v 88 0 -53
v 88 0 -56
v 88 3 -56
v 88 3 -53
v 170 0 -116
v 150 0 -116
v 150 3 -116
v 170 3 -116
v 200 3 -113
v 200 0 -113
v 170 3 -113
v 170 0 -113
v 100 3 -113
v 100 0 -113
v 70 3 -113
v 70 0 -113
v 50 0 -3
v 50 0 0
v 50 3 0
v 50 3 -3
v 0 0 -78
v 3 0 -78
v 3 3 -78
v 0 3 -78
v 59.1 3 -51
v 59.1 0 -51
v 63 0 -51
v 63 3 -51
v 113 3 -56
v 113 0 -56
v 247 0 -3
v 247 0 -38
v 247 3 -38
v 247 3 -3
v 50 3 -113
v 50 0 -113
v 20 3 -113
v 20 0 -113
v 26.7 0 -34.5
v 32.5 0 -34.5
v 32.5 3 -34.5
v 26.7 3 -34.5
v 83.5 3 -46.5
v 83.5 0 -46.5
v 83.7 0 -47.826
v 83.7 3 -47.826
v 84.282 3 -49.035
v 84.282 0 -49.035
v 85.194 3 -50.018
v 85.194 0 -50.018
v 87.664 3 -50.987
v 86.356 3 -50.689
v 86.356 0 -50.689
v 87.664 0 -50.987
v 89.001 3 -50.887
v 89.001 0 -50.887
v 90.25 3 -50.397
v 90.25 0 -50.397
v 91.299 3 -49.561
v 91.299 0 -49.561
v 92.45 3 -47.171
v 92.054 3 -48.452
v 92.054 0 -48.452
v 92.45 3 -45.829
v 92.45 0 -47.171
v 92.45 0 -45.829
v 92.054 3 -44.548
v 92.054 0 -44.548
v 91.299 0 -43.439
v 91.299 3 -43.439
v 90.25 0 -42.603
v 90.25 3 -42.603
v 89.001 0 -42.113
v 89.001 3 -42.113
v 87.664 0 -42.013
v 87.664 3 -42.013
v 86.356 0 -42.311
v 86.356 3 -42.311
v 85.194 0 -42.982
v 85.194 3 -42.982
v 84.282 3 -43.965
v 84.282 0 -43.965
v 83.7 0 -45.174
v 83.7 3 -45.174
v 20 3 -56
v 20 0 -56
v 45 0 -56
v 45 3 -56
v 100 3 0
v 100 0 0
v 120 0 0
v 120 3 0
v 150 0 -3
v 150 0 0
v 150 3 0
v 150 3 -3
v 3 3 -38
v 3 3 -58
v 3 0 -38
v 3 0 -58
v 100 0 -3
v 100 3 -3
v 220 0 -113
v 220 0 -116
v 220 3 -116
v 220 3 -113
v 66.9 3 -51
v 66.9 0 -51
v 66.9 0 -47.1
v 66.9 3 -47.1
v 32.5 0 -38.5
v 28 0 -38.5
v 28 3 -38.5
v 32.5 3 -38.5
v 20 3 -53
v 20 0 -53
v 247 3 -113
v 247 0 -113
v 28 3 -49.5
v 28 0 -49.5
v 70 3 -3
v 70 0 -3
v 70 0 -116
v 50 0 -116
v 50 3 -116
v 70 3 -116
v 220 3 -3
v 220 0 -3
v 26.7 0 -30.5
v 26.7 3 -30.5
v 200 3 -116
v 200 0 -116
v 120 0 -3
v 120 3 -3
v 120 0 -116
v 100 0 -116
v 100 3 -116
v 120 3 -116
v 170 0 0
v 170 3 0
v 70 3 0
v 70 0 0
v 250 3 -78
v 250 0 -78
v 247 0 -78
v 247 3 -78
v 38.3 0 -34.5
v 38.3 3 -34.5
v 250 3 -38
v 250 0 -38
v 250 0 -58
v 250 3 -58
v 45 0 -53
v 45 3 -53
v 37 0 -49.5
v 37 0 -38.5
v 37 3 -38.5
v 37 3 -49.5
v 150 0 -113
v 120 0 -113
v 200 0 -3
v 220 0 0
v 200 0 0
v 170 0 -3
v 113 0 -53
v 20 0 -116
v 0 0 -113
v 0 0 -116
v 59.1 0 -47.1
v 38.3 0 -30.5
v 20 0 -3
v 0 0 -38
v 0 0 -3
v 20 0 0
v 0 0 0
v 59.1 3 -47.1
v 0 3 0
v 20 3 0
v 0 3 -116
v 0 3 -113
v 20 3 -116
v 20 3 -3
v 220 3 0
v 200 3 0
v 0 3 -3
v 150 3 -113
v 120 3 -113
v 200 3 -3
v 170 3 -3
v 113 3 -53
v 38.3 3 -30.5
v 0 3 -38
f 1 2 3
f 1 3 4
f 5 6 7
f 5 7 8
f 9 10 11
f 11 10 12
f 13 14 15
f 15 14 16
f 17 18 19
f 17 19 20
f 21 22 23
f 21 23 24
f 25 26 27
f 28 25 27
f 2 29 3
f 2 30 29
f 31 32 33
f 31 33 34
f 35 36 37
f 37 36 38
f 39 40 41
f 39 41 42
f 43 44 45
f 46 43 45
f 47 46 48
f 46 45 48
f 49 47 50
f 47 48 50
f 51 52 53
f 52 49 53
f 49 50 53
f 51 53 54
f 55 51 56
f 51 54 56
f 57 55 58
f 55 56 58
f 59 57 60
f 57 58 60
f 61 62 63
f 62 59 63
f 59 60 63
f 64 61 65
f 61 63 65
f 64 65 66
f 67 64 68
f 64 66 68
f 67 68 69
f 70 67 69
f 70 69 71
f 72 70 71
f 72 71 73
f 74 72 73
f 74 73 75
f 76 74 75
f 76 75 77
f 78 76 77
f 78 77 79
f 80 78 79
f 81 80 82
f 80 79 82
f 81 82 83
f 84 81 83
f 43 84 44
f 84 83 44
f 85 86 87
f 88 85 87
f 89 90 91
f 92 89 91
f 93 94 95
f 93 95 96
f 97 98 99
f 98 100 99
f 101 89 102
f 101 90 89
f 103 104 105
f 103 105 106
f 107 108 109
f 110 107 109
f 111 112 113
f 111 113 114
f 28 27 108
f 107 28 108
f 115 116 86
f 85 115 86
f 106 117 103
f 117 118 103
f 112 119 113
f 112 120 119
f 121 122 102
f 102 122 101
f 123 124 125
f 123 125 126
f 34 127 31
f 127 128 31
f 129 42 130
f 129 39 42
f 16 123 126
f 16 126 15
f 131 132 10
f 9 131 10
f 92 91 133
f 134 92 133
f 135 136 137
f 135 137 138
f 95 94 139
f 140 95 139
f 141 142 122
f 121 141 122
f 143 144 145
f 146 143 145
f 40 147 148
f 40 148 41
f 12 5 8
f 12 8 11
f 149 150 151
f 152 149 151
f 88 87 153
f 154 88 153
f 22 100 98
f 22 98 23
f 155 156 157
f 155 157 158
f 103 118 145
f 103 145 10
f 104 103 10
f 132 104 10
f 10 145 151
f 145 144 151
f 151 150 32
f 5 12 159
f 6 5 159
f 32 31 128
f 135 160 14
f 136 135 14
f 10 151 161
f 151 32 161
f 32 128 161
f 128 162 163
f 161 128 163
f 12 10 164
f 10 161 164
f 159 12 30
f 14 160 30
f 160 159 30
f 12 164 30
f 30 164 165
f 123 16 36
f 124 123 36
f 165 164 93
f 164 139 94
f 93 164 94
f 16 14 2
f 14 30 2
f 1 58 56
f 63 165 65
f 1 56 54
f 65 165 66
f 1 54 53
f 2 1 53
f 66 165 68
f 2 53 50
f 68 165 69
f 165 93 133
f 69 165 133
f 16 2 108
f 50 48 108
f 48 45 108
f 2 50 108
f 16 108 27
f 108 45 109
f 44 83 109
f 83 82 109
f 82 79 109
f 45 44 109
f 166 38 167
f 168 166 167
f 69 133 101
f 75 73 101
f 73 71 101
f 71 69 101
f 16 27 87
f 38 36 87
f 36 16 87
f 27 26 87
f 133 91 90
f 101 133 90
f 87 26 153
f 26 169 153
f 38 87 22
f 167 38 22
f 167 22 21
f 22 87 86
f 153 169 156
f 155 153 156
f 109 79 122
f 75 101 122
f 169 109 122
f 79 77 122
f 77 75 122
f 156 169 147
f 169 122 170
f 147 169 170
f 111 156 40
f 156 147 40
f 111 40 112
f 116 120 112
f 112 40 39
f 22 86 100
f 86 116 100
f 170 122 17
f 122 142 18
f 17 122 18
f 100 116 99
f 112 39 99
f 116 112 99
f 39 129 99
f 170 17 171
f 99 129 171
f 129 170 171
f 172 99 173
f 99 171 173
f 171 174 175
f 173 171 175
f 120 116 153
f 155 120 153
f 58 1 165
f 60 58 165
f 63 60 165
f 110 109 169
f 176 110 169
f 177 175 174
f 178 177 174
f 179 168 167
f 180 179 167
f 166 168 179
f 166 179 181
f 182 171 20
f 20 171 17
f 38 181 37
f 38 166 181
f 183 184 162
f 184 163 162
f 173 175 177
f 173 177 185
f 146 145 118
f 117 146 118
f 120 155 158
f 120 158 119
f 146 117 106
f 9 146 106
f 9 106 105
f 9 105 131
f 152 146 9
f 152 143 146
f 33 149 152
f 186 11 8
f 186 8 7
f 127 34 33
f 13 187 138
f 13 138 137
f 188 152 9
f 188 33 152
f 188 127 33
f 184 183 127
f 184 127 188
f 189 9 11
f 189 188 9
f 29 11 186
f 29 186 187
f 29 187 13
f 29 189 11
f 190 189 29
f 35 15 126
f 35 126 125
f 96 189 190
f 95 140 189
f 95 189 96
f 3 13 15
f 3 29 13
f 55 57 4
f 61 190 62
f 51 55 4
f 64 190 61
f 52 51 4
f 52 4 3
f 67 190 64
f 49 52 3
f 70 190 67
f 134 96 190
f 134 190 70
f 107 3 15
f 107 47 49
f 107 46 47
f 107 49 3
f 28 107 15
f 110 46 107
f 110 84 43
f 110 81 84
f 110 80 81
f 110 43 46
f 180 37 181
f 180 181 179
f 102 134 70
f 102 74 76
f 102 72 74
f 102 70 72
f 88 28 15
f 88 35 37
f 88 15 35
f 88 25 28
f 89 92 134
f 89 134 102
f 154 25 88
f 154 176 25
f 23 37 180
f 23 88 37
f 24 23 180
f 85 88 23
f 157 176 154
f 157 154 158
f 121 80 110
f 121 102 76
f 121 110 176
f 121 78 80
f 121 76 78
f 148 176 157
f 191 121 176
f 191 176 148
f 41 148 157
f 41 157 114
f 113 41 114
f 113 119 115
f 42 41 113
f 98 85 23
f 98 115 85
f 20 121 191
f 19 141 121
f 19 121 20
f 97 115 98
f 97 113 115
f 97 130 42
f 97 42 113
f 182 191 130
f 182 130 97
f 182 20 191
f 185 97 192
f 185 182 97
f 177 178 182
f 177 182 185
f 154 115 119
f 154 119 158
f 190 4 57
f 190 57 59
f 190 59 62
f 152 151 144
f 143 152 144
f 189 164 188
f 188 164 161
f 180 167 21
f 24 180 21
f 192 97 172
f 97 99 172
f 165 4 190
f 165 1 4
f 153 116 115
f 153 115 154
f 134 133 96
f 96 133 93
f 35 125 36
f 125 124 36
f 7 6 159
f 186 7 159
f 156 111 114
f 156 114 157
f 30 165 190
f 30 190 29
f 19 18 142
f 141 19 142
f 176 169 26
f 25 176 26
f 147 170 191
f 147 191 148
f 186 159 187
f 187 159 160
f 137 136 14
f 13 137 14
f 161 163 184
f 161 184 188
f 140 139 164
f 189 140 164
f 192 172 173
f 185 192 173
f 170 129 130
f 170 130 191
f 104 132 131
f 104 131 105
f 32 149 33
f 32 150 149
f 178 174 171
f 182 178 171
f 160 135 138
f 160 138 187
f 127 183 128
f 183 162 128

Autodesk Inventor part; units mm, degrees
ref_plane "YZ Plane" through (0, 0, 0) normal (1, 0, 0) x (0, 1, 0)
ref_plane "XZ Plane" through (0, 0, 0) normal (0, 1, 0) x (-1, 0, 0)
ref_plane "XY Plane" through (0, 0, 0) normal (0, 0, 1) x (1, 0, 0)
sketch "Sketch1" plane through (0, 0, 0) normal (0, 1, 0) x (-1, 0, 0)
  line L0 (0, 0) -> (0, -3)
  line L1 (-250, -38) -> (-250, -78)
  line L2 (0, 0) -> (-20, 0)
  line L3 (-50, 0) -> (-50, -3)
  line L4 (-50, 0) -> (-70, 0)
  line L5 (-70, 0) -> (-70, -3)
  line L6 (-100, 0) -> (-100, -3)
  line L7 (-100, 0) -> (-120, 0)
  line L8 (-120, 0) -> (-120, -3)
  line L9 (-150, 0) -> (-150, -3)
  line L10 (-150, 0) -> (-170, 0)
  line L11 (-170, 0) -> (-170, -3)
  line L12 (-200, 0) -> (-200, -3)
  line L13 (-200, 0) -> (-220, 0)
  line L14 (-220, 0) -> (-220, -3)
  line L15 (-20, 0) -> (-20, -3)
  line L16 (-250, -58) -> (-250, -78)
  line L17 (-250, -78) -> (-247, -78)
  line L18 (-247, -78) -> (-247, -113)
  line L19 (-250, -58) -> (-250, -38)
  line L20 (-250, -38) -> (-247, -38)
  line L21 (-247, -38) -> (-247, -3)
  line L22 (-220, -3) -> (-247, -3)
  line L23 (-170, -3) -> (-200, -3)
  line L24 (-120, -3) -> (-150, -3)
  line L25 (-20, -3) -> (-50, -3)
  line L26 (-70, -3) -> (-100, -3)
  line L27 (0, -116) -> (0, -113)
  line L28 (0, -116) -> (-20, -116)
  line L29 (-50, -116) -> (-50, -113)
  line L30 (-50, -116) -> (-70, -116)
  line L31 (-70, -116) -> (-70, -113)
  line L32 (-100, -116) -> (-100, -113)
  line L33 (-100, -116) -> (-120, -116)
  line L34 (-120, -116) -> (-120, -113)
  line L35 (-150, -116) -> (-150, -113)
  line L36 (-150, -116) -> (-170, -116)
  line L37 (-170, -116) -> (-170, -113)
  line L38 (-200, -116) -> (-200, -113)
  line L39 (-200, -116) -> (-220, -116)
  line L40 (-220, -116) -> (-220, -113)
  line L41 (-20, -116) -> (-20, -113)
  line L42 (-3, -58) -> (-3, -78)
  line L43 (-3, -78) -> (0, -78)
  line L44 (-3, -58) -> (-3, -38)
  line L45 (-3, -38) -> (0, -38)
  line L46 (0, -113) -> (0, -78)
  line L47 (0, -38) -> (0, -3)
  line L48 (-50, -113) -> (-20, -113)
  line L49 (-100, -113) -> (-70, -113)
  line L50 (-150, -113) -> (-120, -113)
  line L51 (-247, -113) -> (-220, -113)
  line L52 (-200, -113) -> (-170, -113)
  line L53 (-20, -53) -> (-20, -56)
  line L54 (-20, -56) -> (-45, -56)
  line L55 (-45, -56) -> (-45, -53)
  line L56 (-113, -53) -> (-113, -56)
  line L57 (-113, -56) -> (-88, -56)
  line L58 (-88, -56) -> (-88, -53)
  line L59 (-20, -53) -> (-45, -53)
  line L60 (-88, -53) -> (-113, -53)
  line L61 (-63, -51) -> (-66.9, -51)
  line L62 (-66.9, -51) -> (-66.9, -47.1)
  line L63 (-66.9, -47.1) -> (-59.1, -47.1)
  line L64 (-59.1, -47.1) -> (-59.1, -51)
  line L65 (-59.1, -51) -> (-63, -51)
  circle A0 centre (-88, -46.5) radius 4.5
  line L66 (-37, -49.5) -> (-28, -49.5)
  line L67 (-28, -49.5) -> (-28, -38.5)
  line L68 (-28, -38.5) -> (-37, -38.5)
  line L69 (-37, -38.5) -> (-37, -49.5)
  line L70 (-32.5, -38.5) -> (-32.5, -38)
  line L71 (-32.5, -34.5) -> (-26.7, -34.5)
  line L72 (-26.7, -34.5) -> (-26.7, -30.5)
  line L73 (-26.7, -30.5) -> (-38.3, -30.5)
  line L74 (-38.3, -30.5) -> (-38.3, -34.5)
  line L75 (-38.3, -34.5) -> (-32.5, -34.5)
  dimension "d2" = 110
  dimension "d3" = 20
  dimension "d4" = 20
  dimension "d5" = 20
  dimension "d7" = 20
  dimension "d8" = 20
  dimension "d9" = 20
  dimension "d10" = 3
  dimension "d11" = 20
  dimension "d12" = 3
  dimension "d13" = 250
  dimension "d14" = 30
  dimension "d15" = 30
  dimension "d16" = 30
  dimension "d17" = 30
  dimension "d25" = 25
  dimension "d26" = 25
  dimension "d27" = 17
  dimension "d29" = 110
  dimension "d30" = 43
  dimension "d31" = 57
  dimension "d32" = 3
  dimension "d37" = 3.9
  dimension "d38" = 7.8
  dimension "d39" = 60
  dimension "d40" = 2
  dimension "d44" = 9
  dimension "d46" = 78
  dimension "d47" = 3
  dimension "d48" = 6.5
  dimension "d49" = 3
  dimension "d50" = 3
  dimension "d51" = 11
  dimension "d52" = 53
  dimension "d53" = 2
  dimension "d55" = 3.5
  dimension "d57" = 8
  dimension "d58" = 25
  dimension "d60" = 4
  dimension "d62" = 4
  dimension "d63" = 11.6
  dimension "d64" = 9
extrude "Extrusion3" add sketch "Sketch1" along normal blind 3
properties part number "latPort"
